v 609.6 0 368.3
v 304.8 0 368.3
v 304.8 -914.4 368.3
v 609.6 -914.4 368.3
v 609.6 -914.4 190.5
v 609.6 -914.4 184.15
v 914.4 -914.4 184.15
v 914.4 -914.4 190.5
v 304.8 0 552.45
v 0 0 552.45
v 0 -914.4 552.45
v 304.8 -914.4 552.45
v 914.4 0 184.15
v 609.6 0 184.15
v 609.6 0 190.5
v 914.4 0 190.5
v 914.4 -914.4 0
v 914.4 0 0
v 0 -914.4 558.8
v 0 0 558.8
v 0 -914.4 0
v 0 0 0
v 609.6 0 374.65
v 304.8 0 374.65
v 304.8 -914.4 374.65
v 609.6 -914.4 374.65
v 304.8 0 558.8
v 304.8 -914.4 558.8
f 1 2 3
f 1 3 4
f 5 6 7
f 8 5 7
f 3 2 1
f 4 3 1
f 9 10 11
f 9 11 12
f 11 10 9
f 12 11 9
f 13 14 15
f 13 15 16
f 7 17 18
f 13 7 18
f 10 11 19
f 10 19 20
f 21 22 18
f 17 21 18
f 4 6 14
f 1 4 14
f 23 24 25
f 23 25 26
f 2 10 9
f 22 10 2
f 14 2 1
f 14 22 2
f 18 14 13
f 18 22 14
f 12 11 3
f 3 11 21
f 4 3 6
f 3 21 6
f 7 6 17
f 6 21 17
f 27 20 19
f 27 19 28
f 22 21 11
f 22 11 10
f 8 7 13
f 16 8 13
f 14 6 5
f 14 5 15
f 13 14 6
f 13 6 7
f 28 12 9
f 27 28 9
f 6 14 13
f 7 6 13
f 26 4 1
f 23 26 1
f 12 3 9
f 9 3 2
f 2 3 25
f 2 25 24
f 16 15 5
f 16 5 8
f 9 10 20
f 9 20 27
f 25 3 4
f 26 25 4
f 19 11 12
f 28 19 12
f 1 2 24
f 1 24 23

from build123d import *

# Parameters (mm, degrees)
F0_W     = 304.8
F0_H     = 914.4
F3_DEPTH = 552.45
F4_DEPTH = 368.3
F5_DEPTH = 184.15
F6_DEPTH = 6.35


with BuildPart() as f3:
    # F0 (on Top) → F3 (new body)
    with BuildSketch(Plane.XY):
        with Locations((152.4, -457.2)):
            Rectangle(F0_W, F0_H)
    extrude(amount=F3_DEPTH)

    # F0 (on Top) → F4 (join)
    with BuildSketch(Plane.XY):
        with Locations((457.2, -457.2)):
            Rectangle(F0_W, F0_H)
    extrude(amount=F4_DEPTH)

    # F0 (on Top) → F5 (join)
    with BuildSketch(Plane.XY):
        with Locations((762, -457.2)):
            Rectangle(F0_W, F0_H)
    extrude(amount=F5_DEPTH)


with BuildPart() as f6:
    # F6 (new): a face of the model
    f6_faces = [f3.part.faces().sort_by_distance(p)[0] for p in [
        (152.4, -457.2, 552.45),
    ]]
    extrude(f6_faces, amount=F6_DEPTH)


with BuildPart() as f6b:
    # F6#2 (new): a face of the model
    f6_2_faces = [f3.part.faces().sort_by_distance(p)[0] for p in [
        (457.2, -457.2, 368.3),
    ]]
    extrude(f6_2_faces, amount=F6_DEPTH)


with BuildPart() as f6c:
    # F6#3 (new): a face of the model
    f6_3_faces = [f3.part.faces().sort_by_distance(p)[0] for p in [
        (762, -457.2, 184.15),
    ]]
    extrude(f6_3_faces, amount=F6_DEPTH)


solid = Compound([f3.part, f6.part, f6b.part, f6c.part])
